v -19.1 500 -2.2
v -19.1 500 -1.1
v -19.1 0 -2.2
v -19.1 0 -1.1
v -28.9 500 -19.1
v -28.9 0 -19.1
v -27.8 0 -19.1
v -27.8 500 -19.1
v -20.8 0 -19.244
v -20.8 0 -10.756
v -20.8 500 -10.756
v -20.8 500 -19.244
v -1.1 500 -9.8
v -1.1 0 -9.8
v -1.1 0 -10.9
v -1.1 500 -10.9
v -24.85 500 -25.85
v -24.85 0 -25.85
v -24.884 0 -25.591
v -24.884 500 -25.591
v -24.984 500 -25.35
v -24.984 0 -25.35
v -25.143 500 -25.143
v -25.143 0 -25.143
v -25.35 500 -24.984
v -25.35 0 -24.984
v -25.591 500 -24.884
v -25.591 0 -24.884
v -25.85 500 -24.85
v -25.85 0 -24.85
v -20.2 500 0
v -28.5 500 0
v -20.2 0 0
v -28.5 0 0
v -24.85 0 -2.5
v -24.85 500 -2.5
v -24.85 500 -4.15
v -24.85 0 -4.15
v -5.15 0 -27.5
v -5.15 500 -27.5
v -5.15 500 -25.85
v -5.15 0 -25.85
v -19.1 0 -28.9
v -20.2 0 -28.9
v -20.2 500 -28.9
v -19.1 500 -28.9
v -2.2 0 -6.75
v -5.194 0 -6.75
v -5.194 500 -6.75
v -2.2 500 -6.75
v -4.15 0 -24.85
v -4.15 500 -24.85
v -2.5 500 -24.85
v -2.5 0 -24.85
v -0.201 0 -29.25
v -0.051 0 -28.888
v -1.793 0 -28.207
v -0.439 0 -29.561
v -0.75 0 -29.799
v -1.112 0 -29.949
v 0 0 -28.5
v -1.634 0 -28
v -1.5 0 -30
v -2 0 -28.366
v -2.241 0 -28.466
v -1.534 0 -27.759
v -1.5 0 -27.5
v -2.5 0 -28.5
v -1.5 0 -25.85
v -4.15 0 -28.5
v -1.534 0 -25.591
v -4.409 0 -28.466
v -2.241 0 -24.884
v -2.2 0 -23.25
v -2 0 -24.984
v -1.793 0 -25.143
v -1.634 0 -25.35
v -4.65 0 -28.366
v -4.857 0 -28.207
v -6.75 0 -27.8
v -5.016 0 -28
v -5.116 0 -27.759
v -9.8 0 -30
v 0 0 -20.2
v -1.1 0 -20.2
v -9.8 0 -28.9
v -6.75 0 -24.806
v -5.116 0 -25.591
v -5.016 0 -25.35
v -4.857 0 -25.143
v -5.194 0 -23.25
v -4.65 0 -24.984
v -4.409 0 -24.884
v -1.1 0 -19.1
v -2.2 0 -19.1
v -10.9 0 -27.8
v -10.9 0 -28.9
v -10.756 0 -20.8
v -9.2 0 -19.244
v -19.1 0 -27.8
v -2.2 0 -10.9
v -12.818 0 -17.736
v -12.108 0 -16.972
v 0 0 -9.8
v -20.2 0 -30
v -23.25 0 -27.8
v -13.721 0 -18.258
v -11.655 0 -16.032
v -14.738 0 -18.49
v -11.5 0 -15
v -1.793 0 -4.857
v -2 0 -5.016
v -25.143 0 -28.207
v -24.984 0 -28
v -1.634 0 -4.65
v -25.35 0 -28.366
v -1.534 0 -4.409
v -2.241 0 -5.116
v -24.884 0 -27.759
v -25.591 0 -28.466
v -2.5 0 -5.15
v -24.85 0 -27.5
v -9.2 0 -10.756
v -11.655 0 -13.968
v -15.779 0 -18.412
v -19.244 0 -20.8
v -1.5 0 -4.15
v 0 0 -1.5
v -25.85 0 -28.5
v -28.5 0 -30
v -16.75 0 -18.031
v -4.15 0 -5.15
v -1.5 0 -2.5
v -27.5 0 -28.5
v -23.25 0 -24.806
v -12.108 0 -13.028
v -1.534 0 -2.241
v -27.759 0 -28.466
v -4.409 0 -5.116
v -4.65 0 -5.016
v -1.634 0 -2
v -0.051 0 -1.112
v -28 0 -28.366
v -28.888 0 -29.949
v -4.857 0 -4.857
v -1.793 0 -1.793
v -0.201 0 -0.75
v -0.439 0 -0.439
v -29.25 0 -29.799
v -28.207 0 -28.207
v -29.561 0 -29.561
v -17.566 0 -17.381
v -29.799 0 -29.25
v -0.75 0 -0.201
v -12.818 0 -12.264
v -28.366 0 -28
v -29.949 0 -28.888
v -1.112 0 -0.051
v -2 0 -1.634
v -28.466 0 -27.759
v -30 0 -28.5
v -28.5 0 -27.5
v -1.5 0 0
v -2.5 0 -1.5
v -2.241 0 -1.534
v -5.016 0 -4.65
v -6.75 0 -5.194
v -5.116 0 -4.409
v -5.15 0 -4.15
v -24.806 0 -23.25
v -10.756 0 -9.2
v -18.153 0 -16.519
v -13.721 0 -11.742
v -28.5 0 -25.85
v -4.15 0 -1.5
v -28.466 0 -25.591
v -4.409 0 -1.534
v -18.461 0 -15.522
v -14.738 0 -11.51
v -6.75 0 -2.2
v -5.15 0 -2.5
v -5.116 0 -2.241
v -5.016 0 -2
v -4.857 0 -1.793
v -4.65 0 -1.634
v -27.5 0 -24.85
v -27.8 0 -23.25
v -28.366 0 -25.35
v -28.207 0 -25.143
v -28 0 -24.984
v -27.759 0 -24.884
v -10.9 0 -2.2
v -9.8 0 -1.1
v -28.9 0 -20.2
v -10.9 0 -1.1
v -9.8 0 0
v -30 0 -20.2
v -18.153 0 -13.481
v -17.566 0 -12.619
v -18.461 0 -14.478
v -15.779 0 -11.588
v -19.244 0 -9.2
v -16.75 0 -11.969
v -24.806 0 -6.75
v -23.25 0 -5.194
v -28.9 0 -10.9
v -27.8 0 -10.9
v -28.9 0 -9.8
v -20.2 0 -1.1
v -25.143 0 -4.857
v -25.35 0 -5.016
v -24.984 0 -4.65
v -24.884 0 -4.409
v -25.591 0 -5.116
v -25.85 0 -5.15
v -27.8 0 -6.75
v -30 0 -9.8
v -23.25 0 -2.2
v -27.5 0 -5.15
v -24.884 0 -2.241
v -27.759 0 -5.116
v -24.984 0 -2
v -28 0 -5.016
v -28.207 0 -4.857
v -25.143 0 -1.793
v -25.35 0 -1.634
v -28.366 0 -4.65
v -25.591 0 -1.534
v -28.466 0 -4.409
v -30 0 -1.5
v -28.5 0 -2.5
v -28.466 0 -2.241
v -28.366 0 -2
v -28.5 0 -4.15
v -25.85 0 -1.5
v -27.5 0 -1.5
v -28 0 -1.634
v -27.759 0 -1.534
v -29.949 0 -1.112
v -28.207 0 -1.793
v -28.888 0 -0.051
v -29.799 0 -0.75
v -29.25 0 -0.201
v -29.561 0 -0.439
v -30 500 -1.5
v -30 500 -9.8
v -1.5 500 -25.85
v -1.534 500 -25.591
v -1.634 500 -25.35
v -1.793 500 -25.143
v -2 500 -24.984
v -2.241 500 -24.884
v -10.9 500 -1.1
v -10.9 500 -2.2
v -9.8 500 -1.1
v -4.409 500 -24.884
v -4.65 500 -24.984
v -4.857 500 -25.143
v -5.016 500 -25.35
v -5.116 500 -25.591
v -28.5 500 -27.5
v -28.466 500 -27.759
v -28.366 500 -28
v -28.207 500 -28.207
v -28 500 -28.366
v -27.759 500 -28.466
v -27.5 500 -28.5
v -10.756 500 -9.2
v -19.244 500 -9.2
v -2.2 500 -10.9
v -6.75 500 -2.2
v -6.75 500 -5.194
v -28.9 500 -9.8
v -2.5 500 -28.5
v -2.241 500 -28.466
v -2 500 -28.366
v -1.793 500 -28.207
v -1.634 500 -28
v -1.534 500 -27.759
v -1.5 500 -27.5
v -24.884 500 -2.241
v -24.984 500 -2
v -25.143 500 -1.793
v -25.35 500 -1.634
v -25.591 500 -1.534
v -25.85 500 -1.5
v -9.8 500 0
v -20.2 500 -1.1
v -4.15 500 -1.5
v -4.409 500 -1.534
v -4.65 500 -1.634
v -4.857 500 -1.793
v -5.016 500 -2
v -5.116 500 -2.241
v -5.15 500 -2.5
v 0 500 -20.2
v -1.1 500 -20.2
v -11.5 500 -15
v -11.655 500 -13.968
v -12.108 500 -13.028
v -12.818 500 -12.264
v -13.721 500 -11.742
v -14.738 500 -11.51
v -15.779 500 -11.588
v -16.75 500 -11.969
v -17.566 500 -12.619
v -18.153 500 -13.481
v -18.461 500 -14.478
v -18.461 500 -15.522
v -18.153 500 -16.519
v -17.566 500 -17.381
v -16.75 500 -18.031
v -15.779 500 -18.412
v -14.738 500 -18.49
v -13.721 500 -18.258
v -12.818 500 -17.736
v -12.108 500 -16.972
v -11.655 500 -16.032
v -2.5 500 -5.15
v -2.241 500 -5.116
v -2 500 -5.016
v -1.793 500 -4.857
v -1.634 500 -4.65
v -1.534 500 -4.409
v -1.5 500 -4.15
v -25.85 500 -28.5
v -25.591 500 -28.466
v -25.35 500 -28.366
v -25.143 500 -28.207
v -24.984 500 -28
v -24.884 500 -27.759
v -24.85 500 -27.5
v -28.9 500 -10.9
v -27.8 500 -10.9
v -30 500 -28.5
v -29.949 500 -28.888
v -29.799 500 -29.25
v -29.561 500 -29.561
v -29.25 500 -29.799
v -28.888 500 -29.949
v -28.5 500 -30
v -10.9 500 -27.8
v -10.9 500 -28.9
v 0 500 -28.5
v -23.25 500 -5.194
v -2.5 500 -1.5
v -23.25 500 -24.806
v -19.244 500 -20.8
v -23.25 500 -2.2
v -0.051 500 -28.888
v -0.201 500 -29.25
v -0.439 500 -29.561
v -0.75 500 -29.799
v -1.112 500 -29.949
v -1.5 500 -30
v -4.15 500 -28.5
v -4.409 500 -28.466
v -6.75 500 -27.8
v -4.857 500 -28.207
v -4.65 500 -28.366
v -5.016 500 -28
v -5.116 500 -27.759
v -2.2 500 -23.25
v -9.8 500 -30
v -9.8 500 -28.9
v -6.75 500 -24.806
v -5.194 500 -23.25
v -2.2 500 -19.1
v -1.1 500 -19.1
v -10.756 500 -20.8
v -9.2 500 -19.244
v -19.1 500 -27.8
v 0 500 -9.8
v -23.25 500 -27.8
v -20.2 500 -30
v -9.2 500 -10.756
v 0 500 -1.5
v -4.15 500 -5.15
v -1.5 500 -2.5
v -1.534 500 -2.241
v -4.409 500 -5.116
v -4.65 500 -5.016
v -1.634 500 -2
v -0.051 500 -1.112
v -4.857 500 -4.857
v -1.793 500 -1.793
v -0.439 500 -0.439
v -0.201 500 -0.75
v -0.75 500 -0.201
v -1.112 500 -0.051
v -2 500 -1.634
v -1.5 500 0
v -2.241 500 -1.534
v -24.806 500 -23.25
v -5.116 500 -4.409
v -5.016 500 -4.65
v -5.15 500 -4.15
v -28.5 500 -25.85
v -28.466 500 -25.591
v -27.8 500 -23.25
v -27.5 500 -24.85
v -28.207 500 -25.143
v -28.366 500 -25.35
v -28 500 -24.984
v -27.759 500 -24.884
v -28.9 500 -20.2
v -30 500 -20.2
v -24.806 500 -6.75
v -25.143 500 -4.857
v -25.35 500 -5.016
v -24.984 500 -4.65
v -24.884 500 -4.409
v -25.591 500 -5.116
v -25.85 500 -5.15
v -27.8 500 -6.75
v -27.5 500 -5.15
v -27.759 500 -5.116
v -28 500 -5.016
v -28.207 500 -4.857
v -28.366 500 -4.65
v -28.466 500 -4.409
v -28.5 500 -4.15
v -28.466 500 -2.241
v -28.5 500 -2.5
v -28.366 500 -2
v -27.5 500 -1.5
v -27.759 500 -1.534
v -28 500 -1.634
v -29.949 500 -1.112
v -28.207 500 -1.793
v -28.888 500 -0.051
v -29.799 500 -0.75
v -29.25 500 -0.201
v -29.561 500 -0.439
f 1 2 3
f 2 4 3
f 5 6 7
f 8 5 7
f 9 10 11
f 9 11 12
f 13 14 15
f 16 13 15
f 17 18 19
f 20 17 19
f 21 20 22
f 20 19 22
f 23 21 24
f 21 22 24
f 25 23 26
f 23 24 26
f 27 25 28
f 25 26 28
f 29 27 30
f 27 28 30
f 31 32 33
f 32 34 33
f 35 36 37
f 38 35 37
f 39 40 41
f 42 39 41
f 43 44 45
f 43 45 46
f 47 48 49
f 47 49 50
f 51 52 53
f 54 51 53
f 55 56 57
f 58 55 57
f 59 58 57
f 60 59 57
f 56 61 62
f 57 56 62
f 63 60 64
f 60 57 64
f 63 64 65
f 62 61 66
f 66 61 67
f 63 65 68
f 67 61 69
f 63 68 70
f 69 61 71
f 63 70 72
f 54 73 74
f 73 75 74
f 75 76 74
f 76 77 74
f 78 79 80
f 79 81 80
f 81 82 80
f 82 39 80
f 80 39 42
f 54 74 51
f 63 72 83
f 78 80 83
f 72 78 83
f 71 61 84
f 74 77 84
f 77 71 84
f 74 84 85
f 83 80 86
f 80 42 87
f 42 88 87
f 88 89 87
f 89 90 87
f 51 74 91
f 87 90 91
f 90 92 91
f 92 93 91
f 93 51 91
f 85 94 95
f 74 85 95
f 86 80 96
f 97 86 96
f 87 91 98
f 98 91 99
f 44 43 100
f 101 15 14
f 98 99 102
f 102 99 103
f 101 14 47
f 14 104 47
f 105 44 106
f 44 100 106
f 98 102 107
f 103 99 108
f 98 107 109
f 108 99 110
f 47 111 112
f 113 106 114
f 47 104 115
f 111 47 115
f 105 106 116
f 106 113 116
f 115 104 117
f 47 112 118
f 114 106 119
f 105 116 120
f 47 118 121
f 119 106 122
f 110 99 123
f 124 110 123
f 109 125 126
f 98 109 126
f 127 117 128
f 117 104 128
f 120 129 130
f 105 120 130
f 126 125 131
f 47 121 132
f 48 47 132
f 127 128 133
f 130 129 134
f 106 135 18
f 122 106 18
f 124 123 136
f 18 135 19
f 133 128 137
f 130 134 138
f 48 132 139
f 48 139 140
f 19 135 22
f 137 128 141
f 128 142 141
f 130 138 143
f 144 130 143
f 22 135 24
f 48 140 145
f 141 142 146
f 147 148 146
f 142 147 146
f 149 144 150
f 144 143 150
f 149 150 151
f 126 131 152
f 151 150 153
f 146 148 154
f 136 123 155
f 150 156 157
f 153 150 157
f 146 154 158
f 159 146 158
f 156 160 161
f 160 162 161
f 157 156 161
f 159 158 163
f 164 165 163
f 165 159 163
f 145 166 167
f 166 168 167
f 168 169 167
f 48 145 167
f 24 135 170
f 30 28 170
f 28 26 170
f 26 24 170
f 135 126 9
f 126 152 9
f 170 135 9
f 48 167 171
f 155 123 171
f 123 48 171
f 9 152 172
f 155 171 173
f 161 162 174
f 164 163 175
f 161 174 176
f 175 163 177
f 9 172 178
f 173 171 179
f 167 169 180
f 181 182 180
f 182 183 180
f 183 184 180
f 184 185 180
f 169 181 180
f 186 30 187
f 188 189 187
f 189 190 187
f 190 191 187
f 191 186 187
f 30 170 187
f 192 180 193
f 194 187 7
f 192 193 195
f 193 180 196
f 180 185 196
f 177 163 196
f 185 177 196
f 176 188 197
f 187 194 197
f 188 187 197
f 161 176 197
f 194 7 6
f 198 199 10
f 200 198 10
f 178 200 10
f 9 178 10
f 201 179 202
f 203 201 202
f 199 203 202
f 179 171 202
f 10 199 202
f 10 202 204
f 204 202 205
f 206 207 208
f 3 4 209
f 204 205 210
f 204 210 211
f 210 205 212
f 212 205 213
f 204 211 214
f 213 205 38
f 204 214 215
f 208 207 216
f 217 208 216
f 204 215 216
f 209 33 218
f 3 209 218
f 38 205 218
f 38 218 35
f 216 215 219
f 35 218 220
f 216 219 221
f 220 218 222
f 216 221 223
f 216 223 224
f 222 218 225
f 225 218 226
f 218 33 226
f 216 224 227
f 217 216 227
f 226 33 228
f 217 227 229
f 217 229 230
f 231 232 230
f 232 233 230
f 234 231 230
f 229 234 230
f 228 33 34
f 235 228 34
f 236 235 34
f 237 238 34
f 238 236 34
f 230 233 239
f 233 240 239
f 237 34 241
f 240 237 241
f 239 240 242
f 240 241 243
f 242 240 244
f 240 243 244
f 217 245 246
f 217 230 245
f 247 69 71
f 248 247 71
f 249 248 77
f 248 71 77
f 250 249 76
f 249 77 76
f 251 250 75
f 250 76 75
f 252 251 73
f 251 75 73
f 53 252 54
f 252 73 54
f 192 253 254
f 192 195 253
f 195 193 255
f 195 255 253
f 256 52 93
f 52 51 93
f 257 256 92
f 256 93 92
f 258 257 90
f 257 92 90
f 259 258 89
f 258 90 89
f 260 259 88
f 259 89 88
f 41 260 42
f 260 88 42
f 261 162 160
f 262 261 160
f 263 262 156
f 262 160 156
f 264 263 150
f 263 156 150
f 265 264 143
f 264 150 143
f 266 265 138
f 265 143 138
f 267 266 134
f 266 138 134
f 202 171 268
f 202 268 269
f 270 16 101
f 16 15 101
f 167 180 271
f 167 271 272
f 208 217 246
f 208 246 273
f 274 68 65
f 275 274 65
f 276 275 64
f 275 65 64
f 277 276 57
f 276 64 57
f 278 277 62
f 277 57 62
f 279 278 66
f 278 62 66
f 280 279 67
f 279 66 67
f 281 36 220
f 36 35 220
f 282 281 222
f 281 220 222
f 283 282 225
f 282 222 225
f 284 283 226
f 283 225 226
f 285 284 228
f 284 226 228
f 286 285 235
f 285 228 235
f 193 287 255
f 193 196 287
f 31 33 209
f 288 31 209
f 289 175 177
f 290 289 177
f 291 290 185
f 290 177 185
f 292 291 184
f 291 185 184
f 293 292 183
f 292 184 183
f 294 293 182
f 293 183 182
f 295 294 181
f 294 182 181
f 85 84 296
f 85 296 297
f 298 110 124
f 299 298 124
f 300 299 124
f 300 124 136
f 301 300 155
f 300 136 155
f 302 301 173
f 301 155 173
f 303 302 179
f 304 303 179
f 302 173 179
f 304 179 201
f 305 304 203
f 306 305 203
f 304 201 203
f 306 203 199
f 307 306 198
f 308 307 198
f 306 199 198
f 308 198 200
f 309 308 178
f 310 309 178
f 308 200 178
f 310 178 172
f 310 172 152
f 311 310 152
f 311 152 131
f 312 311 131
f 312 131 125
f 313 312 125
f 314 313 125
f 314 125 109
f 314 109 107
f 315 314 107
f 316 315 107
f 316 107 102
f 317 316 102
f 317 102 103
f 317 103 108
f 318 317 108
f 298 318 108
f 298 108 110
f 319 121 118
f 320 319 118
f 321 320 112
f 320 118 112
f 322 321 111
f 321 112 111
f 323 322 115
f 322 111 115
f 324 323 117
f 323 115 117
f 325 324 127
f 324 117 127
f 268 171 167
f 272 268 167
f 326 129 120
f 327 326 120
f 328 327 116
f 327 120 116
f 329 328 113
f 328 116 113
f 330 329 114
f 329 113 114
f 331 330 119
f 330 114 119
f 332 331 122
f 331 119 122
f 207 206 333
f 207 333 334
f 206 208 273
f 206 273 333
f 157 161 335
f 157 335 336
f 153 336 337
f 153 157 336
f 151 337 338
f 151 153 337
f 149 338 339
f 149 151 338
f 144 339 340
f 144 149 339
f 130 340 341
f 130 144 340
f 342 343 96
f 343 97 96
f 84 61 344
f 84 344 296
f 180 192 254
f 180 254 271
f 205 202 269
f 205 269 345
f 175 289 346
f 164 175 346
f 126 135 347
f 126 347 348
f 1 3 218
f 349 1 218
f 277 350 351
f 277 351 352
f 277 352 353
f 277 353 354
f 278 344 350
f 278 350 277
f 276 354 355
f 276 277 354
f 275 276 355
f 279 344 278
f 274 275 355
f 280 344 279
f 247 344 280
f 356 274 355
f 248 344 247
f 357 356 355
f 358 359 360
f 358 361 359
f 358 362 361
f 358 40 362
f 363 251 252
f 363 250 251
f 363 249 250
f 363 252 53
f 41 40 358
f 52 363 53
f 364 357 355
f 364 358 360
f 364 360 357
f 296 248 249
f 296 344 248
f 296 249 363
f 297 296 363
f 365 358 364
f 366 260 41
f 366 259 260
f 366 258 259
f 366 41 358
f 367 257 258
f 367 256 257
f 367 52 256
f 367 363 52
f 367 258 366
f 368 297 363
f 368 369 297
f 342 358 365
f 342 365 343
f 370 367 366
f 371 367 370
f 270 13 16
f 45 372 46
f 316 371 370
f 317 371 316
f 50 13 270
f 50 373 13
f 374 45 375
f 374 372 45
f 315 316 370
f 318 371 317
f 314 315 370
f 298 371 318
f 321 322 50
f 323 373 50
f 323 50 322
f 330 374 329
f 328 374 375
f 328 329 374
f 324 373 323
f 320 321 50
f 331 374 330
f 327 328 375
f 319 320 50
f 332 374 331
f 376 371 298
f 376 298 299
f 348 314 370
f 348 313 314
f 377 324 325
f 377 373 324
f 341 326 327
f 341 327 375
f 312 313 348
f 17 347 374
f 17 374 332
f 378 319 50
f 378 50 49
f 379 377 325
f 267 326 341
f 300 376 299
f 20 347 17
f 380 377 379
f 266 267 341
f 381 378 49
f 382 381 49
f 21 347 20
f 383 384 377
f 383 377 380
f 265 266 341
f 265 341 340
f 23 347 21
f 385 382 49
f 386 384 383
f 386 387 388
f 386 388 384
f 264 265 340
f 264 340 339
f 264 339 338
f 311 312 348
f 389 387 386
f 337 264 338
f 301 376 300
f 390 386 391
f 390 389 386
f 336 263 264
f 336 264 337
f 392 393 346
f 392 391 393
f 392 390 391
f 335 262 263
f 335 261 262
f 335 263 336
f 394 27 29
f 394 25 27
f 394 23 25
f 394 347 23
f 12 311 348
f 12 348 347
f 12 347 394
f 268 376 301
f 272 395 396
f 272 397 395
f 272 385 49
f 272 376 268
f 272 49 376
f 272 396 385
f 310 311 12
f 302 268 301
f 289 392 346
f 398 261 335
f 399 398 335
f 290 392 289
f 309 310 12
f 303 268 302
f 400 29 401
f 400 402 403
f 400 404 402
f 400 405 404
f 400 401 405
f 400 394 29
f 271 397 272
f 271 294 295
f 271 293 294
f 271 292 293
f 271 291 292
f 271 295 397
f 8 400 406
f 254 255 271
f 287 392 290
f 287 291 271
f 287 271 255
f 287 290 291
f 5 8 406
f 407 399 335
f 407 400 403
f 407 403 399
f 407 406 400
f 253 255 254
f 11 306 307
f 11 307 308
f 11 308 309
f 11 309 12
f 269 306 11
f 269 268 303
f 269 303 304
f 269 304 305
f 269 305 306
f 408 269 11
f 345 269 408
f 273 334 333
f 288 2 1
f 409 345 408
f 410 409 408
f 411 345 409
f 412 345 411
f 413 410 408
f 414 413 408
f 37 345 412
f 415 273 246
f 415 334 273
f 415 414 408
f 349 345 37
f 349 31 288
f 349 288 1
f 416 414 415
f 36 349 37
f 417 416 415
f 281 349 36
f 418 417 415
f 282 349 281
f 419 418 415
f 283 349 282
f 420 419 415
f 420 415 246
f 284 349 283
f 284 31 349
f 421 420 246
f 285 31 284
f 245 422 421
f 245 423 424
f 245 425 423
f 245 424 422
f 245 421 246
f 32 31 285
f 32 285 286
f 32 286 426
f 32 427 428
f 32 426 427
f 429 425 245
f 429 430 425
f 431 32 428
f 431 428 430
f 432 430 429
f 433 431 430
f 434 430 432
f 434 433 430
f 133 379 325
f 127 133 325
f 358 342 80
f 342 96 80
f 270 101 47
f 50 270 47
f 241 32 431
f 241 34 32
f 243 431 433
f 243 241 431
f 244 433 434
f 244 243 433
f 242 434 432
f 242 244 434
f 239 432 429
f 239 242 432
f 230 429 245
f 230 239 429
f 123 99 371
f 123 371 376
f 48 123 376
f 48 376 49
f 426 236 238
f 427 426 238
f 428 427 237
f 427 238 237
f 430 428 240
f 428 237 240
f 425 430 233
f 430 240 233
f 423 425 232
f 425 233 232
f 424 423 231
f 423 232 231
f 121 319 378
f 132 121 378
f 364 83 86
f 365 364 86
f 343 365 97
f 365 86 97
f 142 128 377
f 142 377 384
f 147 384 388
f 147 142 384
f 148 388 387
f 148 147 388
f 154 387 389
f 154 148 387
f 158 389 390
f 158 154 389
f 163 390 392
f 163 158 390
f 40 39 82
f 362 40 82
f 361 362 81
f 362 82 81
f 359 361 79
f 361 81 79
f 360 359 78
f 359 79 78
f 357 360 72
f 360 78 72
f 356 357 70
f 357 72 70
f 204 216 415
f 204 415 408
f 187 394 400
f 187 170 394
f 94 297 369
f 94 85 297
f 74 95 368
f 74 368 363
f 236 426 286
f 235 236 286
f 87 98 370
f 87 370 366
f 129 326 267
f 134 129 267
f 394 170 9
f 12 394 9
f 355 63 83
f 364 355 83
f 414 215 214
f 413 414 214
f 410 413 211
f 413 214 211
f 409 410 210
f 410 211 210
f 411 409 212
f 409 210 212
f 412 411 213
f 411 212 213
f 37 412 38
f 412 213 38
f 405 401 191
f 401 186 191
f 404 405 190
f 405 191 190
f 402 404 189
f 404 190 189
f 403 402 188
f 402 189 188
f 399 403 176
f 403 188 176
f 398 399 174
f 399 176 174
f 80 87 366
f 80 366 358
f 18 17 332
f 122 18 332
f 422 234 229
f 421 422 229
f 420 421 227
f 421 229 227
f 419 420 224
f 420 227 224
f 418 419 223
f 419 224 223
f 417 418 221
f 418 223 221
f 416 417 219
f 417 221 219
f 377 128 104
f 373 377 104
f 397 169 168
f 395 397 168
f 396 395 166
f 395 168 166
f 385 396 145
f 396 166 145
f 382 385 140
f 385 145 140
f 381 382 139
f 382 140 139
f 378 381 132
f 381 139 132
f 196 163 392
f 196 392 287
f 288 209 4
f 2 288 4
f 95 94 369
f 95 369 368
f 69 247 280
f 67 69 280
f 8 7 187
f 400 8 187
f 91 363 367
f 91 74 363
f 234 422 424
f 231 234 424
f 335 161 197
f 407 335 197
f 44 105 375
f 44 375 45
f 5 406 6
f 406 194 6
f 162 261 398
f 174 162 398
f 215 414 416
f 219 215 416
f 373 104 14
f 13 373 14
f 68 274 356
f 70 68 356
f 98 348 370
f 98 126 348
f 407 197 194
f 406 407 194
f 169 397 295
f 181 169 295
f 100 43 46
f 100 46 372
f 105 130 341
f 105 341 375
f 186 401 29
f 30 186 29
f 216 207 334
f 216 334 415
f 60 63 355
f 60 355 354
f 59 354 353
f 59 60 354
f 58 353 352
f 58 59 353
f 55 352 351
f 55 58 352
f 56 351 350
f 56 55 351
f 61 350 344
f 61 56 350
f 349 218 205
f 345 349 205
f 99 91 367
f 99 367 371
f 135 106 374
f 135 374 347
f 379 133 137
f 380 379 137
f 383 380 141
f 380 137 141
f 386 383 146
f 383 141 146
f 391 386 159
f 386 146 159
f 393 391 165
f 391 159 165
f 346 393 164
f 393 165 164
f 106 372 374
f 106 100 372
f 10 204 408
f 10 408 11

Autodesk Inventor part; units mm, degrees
ref_plane "YZ Plane" through (0, 0, 0) normal (1, 0, 0) x (0, 1, 0)
ref_plane "XZ Plane" through (0, 0, 0) normal (0, 1, 0) x (-1, 0, 0)
ref_plane "XY Plane" through (0, 0, 0) normal (0, 0, 1) x (1, 0, 0)
sketch "Sketch1" plane through (0, 0, 0) normal (0, 1, 0) x (-1, 0, 0)
  line L0 (0, -1.5) -> (0, -9.8)
  line L1 (0, -9.8) -> (1.1, -9.8)
  line L2 (1.1, -9.8) -> (1.1, -10.9)
  line L3 (1.1, -10.9) -> (2.2, -10.9)
  line L4 (2.2, -10.9) -> (2.2, -6.75)
  line L5 (0, -28.5) -> (0, -20.2)
  line L6 (0, -20.2) -> (1.1, -20.2)
  line L7 (1.1, -20.2) -> (1.1, -19.1)
  line L8 (1.1, -19.1) -> (2.2, -19.1)
  line L9 (2.2, -19.1) -> (2.2, -23.25)
  line L10 (1.5, 0) -> (9.8, 0)
  line L11 (9.8, 0) -> (9.8, -1.1)
  line L12 (9.8, -1.1) -> (10.9, -1.1)
  line L13 (10.9, -1.1) -> (10.9, -2.2)
  line L14 (10.9, -2.2) -> (6.75, -2.2)
  line L15 (28.5, 0) -> (20.2, 0)
  line L16 (20.2, 0) -> (20.2, -1.1)
  line L17 (20.2, -1.1) -> (19.1, -1.1)
  line L18 (19.1, -1.1) -> (19.1, -2.2)
  line L19 (19.1, -2.2) -> (23.25, -2.2)
  line L20 (30, -1.5) -> (30, -9.8)
  line L21 (30, -9.8) -> (28.9, -9.8)
  line L22 (28.9, -9.8) -> (28.9, -10.9)
  line L23 (28.9, -10.9) -> (27.8, -10.9)
  line L24 (27.8, -10.9) -> (27.8, -6.75)
  line L25 (30, -28.5) -> (30, -20.2)
  line L26 (30, -20.2) -> (28.9, -20.2)
  line L27 (28.9, -20.2) -> (28.9, -19.1)
  line L28 (28.9, -19.1) -> (27.8, -19.1)
  line L29 (27.8, -19.1) -> (27.8, -23.25)
  line L30 (28.5, -30) -> (20.2, -30)
  line L31 (20.2, -30) -> (20.2, -28.9)
  line L32 (20.2, -28.9) -> (19.1, -28.9)
  line L33 (19.1, -28.9) -> (19.1, -27.8)
  line L34 (19.1, -27.8) -> (23.25, -27.8)
  line L35 (1.5, -30) -> (9.8, -30)
  line L36 (9.8, -30) -> (9.8, -28.9)
  line L37 (9.8, -28.9) -> (10.9, -28.9)
  line L38 (10.9, -28.9) -> (10.9, -27.8)
  line L39 (10.9, -27.8) -> (6.75, -27.8)
  line L40 (6.75, -2.2) -> (6.75, -6.75)
  line L41 (6.75, -6.75) -> (2.2, -6.75)
  line L42 (2.2, -23.25) -> (6.75, -23.25)
  line L43 (6.75, -23.25) -> (6.75, -27.8)
  line L44 (23.25, -27.8) -> (23.25, -23.25)
  line L45 (23.25, -23.25) -> (27.8, -23.25)
  line L46 (27.8, -6.75) -> (23.25, -6.75)
  line L47 (23.25, -2.2) -> (23.25, -6.75)
  line L48 (9.2, -9.2) -> (20.8, -9.2)
  line L49 (20.8, -9.2) -> (20.8, -20.8)
  line L50 (20.8, -20.8) -> (9.2, -20.8)
  line L51 (9.2, -20.8) -> (9.2, -9.2)
  line L52 (23.25, -6.75) -> (23.25, -5.194)
  line L53 (23.25, -6.75) -> (24.806, -6.75)
  line L54 (6.75, -6.75) -> (5.194, -6.75)
  line L55 (6.75, -6.75) -> (6.75, -5.194)
  line L56 (6.75, -23.25) -> (5.194, -23.25)
  line L57 (6.75, -23.25) -> (6.75, -24.806)
  line L58 (23.25, -23.25) -> (23.25, -24.806)
  line L59 (23.25, -23.25) -> (24.806, -23.25)
  line L60 (5.194, -23.25) -> (23.25, -5.194)
  line L61 (24.806, -6.75) -> (6.75, -24.806)
  circle A0 centre (15, -15) radius 3.4
  arc A1 (1.5, 0) -> (0, -1.5) centre (1.5, -1.5) ccw
  arc A2 (0, -28.5) -> (1.5, -30) centre (1.5, -28.5) ccw
  arc A3 (28.5, -30) -> (30, -28.5) centre (28.5, -28.5) ccw
  arc A4 (30, -1.5) -> (28.5, 0) centre (28.5, -1.5) ccw
  line L62 (27.5, -1.5) -> (25.85, -1.5)
  line L63 (24.85, -2.5) -> (24.85, -4.15)
  line L64 (25.85, -5.15) -> (27.5, -5.15)
  line L65 (28.5, -4.15) -> (28.5, -2.5)
  line L66 (27.5, -24.85) -> (25.85, -24.85)
  line L67 (24.85, -25.85) -> (24.85, -27.5)
  line L68 (25.85, -28.5) -> (27.5, -28.5)
  line L69 (28.5, -27.5) -> (28.5, -25.85)
  line L70 (4.15, -24.85) -> (2.5, -24.85)
  line L71 (1.5, -25.85) -> (1.5, -27.5)
  line L72 (2.5, -28.5) -> (4.15, -28.5)
  line L73 (5.15, -27.5) -> (5.15, -25.85)
  line L74 (4.15, -1.5) -> (2.5, -1.5)
  line L75 (1.5, -2.5) -> (1.5, -4.15)
  line L76 (2.5, -5.15) -> (4.15, -5.15)
  line L77 (5.15, -4.15) -> (5.15, -2.5)
  arc A5 (27.5, -5.15) -> (28.5, -4.15) centre (27.5, -4.15) ccw
  arc A6 (28.5, -2.5) -> (27.5, -1.5) centre (27.5, -2.5) ccw
  arc A7 (25.85, -1.5) -> (24.85, -2.5) centre (25.85, -2.5) ccw
  arc A8 (24.85, -4.15) -> (25.85, -5.15) centre (25.85, -4.15) ccw
  arc A9 (5.15, -2.5) -> (4.15, -1.5) centre (4.15, -2.5) ccw
  arc A10 (1.5, -4.15) -> (2.5, -5.15) centre (2.5, -4.15) ccw
  arc A11 (4.15, -5.15) -> (5.15, -4.15) centre (4.15, -4.15) ccw
  arc A12 (2.5, -1.5) -> (1.5, -2.5) centre (2.5, -2.5) ccw
  arc A13 (2.5, -24.85) -> (1.5, -25.85) centre (2.5, -25.85) ccw
  arc A14 (5.15, -25.85) -> (4.15, -24.85) centre (4.15, -25.85) ccw
  arc A15 (4.15, -28.5) -> (5.15, -27.5) centre (4.15, -27.5) ccw
  arc A16 (1.5, -27.5) -> (2.5, -28.5) centre (2.5, -27.5) ccw
  arc A17 (25.85, -24.85) -> (24.85, -25.85) centre (25.85, -25.85) ccw
  arc A18 (28.5, -25.85) -> (27.5, -24.85) centre (27.5, -25.85) ccw
  arc A19 (27.5, -28.5) -> (28.5, -27.5) centre (27.5, -27.5) ccw
  arc A20 (24.85, -27.5) -> (25.85, -28.5) centre (25.85, -27.5) ccw
  line L78 (24.806, -23.25) -> (6.75, -5.194)
  line L79 (23.25, -24.806) -> (5.194, -6.75)
  point P0 (0, 0)
  point P1 (0, -30)
  point P2 (9.2, -15)
  point P3 (0, -15)
  point P4 (15, 0)
  point P5 (15, -9.2)
  dimension "d52" = 9.8
  dimension "d61" = 6.8
  dimension "d62" = 1.5
  dimension "d75" = 1.5
  dimension "d76" = 1.5
  dimension "d81" = 1
  dimension "d82" = 1.556
  dimension "d83" = 1.556
  dimension "d84" = 1.556
  dimension "d85" = 1.556
  dimension "d86" = 1.556
  dimension "d87" = 1.556
  dimension "d88" = 1.556
extrude "Extrusion1" add sketch "Sketch1" along normal blind 500 contours A1 L10 L11 L12 L13 L14 L40 L41 L4 L3 L2 L1 L0 | L41 L40 L78 L48 L51 L79 | L79 A0 L60 L51 | L51 L48 L78 A0 L79 | L60 A0 L61 L50 L51 | L51 L50 L61 L43 L42 L60 | A0 L78 L60 L79 | L48 L60 A0 L78 | L42 L43 L39 L38 L37 L36 L35 A2 L5 L6 L7 L8 L9 | L60 L79 L61 A0 | L60 L78 L61 L79 | L60 L47 L46 L61 L49 L48 | L48 L49 L61 A0 L60 | L61 A0 L79 L50 | A0 L61 L78 L60 | L61 L78 A0 L79 | L47 L19 L18 L17 L16 L15 A4 L20 L21 L22 L23 L24 L46 | L79 A0 L78 L49 L50 | L50 L49 L78 L45 L44 L79 | L61 L49 L78 A0 | L44 L45 L29 L28 L27 L26 L25 A3 L30 L31 L32 L33 L34
sketch "Sketch2" plane through (0, 0, 0) normal (0, -1, 0) x (1, 0, 0)
  circle A0 centre (-15, -15) radius 3.5
  line L0 (-20.2, -30) -> (-9.8, -30)
  line L1 (-1.5, -30) -> (-9.8, -30) projected
  line L2 (-30, -9.8) -> (-30, -20.2)
  point P0 (0, 0)
  point P1 (-30, -15)
  point P2 (-15, -30)
  dimension "d91" = 7
extrude "Extrusion2" cut sketch "Sketch2" against normal blind 500
sketch "Sketch3" plane through (0, 0, 0) normal (0, -1, 0) x (1, 0, 0)
  point P0 (0, 0)
sketch "Sketch4" plane through (-19.244, 0, -9.2) normal (0, 0, 1) x (1, 0, 0)
  point P0 (34.244, 485)
sketch "Sketch5" plane through (-19.244, 0, -9.2) normal (0, 0, 1) x (1, 0, 0)
  point P0 (-25.756, 15)
properties part number "Balka"
